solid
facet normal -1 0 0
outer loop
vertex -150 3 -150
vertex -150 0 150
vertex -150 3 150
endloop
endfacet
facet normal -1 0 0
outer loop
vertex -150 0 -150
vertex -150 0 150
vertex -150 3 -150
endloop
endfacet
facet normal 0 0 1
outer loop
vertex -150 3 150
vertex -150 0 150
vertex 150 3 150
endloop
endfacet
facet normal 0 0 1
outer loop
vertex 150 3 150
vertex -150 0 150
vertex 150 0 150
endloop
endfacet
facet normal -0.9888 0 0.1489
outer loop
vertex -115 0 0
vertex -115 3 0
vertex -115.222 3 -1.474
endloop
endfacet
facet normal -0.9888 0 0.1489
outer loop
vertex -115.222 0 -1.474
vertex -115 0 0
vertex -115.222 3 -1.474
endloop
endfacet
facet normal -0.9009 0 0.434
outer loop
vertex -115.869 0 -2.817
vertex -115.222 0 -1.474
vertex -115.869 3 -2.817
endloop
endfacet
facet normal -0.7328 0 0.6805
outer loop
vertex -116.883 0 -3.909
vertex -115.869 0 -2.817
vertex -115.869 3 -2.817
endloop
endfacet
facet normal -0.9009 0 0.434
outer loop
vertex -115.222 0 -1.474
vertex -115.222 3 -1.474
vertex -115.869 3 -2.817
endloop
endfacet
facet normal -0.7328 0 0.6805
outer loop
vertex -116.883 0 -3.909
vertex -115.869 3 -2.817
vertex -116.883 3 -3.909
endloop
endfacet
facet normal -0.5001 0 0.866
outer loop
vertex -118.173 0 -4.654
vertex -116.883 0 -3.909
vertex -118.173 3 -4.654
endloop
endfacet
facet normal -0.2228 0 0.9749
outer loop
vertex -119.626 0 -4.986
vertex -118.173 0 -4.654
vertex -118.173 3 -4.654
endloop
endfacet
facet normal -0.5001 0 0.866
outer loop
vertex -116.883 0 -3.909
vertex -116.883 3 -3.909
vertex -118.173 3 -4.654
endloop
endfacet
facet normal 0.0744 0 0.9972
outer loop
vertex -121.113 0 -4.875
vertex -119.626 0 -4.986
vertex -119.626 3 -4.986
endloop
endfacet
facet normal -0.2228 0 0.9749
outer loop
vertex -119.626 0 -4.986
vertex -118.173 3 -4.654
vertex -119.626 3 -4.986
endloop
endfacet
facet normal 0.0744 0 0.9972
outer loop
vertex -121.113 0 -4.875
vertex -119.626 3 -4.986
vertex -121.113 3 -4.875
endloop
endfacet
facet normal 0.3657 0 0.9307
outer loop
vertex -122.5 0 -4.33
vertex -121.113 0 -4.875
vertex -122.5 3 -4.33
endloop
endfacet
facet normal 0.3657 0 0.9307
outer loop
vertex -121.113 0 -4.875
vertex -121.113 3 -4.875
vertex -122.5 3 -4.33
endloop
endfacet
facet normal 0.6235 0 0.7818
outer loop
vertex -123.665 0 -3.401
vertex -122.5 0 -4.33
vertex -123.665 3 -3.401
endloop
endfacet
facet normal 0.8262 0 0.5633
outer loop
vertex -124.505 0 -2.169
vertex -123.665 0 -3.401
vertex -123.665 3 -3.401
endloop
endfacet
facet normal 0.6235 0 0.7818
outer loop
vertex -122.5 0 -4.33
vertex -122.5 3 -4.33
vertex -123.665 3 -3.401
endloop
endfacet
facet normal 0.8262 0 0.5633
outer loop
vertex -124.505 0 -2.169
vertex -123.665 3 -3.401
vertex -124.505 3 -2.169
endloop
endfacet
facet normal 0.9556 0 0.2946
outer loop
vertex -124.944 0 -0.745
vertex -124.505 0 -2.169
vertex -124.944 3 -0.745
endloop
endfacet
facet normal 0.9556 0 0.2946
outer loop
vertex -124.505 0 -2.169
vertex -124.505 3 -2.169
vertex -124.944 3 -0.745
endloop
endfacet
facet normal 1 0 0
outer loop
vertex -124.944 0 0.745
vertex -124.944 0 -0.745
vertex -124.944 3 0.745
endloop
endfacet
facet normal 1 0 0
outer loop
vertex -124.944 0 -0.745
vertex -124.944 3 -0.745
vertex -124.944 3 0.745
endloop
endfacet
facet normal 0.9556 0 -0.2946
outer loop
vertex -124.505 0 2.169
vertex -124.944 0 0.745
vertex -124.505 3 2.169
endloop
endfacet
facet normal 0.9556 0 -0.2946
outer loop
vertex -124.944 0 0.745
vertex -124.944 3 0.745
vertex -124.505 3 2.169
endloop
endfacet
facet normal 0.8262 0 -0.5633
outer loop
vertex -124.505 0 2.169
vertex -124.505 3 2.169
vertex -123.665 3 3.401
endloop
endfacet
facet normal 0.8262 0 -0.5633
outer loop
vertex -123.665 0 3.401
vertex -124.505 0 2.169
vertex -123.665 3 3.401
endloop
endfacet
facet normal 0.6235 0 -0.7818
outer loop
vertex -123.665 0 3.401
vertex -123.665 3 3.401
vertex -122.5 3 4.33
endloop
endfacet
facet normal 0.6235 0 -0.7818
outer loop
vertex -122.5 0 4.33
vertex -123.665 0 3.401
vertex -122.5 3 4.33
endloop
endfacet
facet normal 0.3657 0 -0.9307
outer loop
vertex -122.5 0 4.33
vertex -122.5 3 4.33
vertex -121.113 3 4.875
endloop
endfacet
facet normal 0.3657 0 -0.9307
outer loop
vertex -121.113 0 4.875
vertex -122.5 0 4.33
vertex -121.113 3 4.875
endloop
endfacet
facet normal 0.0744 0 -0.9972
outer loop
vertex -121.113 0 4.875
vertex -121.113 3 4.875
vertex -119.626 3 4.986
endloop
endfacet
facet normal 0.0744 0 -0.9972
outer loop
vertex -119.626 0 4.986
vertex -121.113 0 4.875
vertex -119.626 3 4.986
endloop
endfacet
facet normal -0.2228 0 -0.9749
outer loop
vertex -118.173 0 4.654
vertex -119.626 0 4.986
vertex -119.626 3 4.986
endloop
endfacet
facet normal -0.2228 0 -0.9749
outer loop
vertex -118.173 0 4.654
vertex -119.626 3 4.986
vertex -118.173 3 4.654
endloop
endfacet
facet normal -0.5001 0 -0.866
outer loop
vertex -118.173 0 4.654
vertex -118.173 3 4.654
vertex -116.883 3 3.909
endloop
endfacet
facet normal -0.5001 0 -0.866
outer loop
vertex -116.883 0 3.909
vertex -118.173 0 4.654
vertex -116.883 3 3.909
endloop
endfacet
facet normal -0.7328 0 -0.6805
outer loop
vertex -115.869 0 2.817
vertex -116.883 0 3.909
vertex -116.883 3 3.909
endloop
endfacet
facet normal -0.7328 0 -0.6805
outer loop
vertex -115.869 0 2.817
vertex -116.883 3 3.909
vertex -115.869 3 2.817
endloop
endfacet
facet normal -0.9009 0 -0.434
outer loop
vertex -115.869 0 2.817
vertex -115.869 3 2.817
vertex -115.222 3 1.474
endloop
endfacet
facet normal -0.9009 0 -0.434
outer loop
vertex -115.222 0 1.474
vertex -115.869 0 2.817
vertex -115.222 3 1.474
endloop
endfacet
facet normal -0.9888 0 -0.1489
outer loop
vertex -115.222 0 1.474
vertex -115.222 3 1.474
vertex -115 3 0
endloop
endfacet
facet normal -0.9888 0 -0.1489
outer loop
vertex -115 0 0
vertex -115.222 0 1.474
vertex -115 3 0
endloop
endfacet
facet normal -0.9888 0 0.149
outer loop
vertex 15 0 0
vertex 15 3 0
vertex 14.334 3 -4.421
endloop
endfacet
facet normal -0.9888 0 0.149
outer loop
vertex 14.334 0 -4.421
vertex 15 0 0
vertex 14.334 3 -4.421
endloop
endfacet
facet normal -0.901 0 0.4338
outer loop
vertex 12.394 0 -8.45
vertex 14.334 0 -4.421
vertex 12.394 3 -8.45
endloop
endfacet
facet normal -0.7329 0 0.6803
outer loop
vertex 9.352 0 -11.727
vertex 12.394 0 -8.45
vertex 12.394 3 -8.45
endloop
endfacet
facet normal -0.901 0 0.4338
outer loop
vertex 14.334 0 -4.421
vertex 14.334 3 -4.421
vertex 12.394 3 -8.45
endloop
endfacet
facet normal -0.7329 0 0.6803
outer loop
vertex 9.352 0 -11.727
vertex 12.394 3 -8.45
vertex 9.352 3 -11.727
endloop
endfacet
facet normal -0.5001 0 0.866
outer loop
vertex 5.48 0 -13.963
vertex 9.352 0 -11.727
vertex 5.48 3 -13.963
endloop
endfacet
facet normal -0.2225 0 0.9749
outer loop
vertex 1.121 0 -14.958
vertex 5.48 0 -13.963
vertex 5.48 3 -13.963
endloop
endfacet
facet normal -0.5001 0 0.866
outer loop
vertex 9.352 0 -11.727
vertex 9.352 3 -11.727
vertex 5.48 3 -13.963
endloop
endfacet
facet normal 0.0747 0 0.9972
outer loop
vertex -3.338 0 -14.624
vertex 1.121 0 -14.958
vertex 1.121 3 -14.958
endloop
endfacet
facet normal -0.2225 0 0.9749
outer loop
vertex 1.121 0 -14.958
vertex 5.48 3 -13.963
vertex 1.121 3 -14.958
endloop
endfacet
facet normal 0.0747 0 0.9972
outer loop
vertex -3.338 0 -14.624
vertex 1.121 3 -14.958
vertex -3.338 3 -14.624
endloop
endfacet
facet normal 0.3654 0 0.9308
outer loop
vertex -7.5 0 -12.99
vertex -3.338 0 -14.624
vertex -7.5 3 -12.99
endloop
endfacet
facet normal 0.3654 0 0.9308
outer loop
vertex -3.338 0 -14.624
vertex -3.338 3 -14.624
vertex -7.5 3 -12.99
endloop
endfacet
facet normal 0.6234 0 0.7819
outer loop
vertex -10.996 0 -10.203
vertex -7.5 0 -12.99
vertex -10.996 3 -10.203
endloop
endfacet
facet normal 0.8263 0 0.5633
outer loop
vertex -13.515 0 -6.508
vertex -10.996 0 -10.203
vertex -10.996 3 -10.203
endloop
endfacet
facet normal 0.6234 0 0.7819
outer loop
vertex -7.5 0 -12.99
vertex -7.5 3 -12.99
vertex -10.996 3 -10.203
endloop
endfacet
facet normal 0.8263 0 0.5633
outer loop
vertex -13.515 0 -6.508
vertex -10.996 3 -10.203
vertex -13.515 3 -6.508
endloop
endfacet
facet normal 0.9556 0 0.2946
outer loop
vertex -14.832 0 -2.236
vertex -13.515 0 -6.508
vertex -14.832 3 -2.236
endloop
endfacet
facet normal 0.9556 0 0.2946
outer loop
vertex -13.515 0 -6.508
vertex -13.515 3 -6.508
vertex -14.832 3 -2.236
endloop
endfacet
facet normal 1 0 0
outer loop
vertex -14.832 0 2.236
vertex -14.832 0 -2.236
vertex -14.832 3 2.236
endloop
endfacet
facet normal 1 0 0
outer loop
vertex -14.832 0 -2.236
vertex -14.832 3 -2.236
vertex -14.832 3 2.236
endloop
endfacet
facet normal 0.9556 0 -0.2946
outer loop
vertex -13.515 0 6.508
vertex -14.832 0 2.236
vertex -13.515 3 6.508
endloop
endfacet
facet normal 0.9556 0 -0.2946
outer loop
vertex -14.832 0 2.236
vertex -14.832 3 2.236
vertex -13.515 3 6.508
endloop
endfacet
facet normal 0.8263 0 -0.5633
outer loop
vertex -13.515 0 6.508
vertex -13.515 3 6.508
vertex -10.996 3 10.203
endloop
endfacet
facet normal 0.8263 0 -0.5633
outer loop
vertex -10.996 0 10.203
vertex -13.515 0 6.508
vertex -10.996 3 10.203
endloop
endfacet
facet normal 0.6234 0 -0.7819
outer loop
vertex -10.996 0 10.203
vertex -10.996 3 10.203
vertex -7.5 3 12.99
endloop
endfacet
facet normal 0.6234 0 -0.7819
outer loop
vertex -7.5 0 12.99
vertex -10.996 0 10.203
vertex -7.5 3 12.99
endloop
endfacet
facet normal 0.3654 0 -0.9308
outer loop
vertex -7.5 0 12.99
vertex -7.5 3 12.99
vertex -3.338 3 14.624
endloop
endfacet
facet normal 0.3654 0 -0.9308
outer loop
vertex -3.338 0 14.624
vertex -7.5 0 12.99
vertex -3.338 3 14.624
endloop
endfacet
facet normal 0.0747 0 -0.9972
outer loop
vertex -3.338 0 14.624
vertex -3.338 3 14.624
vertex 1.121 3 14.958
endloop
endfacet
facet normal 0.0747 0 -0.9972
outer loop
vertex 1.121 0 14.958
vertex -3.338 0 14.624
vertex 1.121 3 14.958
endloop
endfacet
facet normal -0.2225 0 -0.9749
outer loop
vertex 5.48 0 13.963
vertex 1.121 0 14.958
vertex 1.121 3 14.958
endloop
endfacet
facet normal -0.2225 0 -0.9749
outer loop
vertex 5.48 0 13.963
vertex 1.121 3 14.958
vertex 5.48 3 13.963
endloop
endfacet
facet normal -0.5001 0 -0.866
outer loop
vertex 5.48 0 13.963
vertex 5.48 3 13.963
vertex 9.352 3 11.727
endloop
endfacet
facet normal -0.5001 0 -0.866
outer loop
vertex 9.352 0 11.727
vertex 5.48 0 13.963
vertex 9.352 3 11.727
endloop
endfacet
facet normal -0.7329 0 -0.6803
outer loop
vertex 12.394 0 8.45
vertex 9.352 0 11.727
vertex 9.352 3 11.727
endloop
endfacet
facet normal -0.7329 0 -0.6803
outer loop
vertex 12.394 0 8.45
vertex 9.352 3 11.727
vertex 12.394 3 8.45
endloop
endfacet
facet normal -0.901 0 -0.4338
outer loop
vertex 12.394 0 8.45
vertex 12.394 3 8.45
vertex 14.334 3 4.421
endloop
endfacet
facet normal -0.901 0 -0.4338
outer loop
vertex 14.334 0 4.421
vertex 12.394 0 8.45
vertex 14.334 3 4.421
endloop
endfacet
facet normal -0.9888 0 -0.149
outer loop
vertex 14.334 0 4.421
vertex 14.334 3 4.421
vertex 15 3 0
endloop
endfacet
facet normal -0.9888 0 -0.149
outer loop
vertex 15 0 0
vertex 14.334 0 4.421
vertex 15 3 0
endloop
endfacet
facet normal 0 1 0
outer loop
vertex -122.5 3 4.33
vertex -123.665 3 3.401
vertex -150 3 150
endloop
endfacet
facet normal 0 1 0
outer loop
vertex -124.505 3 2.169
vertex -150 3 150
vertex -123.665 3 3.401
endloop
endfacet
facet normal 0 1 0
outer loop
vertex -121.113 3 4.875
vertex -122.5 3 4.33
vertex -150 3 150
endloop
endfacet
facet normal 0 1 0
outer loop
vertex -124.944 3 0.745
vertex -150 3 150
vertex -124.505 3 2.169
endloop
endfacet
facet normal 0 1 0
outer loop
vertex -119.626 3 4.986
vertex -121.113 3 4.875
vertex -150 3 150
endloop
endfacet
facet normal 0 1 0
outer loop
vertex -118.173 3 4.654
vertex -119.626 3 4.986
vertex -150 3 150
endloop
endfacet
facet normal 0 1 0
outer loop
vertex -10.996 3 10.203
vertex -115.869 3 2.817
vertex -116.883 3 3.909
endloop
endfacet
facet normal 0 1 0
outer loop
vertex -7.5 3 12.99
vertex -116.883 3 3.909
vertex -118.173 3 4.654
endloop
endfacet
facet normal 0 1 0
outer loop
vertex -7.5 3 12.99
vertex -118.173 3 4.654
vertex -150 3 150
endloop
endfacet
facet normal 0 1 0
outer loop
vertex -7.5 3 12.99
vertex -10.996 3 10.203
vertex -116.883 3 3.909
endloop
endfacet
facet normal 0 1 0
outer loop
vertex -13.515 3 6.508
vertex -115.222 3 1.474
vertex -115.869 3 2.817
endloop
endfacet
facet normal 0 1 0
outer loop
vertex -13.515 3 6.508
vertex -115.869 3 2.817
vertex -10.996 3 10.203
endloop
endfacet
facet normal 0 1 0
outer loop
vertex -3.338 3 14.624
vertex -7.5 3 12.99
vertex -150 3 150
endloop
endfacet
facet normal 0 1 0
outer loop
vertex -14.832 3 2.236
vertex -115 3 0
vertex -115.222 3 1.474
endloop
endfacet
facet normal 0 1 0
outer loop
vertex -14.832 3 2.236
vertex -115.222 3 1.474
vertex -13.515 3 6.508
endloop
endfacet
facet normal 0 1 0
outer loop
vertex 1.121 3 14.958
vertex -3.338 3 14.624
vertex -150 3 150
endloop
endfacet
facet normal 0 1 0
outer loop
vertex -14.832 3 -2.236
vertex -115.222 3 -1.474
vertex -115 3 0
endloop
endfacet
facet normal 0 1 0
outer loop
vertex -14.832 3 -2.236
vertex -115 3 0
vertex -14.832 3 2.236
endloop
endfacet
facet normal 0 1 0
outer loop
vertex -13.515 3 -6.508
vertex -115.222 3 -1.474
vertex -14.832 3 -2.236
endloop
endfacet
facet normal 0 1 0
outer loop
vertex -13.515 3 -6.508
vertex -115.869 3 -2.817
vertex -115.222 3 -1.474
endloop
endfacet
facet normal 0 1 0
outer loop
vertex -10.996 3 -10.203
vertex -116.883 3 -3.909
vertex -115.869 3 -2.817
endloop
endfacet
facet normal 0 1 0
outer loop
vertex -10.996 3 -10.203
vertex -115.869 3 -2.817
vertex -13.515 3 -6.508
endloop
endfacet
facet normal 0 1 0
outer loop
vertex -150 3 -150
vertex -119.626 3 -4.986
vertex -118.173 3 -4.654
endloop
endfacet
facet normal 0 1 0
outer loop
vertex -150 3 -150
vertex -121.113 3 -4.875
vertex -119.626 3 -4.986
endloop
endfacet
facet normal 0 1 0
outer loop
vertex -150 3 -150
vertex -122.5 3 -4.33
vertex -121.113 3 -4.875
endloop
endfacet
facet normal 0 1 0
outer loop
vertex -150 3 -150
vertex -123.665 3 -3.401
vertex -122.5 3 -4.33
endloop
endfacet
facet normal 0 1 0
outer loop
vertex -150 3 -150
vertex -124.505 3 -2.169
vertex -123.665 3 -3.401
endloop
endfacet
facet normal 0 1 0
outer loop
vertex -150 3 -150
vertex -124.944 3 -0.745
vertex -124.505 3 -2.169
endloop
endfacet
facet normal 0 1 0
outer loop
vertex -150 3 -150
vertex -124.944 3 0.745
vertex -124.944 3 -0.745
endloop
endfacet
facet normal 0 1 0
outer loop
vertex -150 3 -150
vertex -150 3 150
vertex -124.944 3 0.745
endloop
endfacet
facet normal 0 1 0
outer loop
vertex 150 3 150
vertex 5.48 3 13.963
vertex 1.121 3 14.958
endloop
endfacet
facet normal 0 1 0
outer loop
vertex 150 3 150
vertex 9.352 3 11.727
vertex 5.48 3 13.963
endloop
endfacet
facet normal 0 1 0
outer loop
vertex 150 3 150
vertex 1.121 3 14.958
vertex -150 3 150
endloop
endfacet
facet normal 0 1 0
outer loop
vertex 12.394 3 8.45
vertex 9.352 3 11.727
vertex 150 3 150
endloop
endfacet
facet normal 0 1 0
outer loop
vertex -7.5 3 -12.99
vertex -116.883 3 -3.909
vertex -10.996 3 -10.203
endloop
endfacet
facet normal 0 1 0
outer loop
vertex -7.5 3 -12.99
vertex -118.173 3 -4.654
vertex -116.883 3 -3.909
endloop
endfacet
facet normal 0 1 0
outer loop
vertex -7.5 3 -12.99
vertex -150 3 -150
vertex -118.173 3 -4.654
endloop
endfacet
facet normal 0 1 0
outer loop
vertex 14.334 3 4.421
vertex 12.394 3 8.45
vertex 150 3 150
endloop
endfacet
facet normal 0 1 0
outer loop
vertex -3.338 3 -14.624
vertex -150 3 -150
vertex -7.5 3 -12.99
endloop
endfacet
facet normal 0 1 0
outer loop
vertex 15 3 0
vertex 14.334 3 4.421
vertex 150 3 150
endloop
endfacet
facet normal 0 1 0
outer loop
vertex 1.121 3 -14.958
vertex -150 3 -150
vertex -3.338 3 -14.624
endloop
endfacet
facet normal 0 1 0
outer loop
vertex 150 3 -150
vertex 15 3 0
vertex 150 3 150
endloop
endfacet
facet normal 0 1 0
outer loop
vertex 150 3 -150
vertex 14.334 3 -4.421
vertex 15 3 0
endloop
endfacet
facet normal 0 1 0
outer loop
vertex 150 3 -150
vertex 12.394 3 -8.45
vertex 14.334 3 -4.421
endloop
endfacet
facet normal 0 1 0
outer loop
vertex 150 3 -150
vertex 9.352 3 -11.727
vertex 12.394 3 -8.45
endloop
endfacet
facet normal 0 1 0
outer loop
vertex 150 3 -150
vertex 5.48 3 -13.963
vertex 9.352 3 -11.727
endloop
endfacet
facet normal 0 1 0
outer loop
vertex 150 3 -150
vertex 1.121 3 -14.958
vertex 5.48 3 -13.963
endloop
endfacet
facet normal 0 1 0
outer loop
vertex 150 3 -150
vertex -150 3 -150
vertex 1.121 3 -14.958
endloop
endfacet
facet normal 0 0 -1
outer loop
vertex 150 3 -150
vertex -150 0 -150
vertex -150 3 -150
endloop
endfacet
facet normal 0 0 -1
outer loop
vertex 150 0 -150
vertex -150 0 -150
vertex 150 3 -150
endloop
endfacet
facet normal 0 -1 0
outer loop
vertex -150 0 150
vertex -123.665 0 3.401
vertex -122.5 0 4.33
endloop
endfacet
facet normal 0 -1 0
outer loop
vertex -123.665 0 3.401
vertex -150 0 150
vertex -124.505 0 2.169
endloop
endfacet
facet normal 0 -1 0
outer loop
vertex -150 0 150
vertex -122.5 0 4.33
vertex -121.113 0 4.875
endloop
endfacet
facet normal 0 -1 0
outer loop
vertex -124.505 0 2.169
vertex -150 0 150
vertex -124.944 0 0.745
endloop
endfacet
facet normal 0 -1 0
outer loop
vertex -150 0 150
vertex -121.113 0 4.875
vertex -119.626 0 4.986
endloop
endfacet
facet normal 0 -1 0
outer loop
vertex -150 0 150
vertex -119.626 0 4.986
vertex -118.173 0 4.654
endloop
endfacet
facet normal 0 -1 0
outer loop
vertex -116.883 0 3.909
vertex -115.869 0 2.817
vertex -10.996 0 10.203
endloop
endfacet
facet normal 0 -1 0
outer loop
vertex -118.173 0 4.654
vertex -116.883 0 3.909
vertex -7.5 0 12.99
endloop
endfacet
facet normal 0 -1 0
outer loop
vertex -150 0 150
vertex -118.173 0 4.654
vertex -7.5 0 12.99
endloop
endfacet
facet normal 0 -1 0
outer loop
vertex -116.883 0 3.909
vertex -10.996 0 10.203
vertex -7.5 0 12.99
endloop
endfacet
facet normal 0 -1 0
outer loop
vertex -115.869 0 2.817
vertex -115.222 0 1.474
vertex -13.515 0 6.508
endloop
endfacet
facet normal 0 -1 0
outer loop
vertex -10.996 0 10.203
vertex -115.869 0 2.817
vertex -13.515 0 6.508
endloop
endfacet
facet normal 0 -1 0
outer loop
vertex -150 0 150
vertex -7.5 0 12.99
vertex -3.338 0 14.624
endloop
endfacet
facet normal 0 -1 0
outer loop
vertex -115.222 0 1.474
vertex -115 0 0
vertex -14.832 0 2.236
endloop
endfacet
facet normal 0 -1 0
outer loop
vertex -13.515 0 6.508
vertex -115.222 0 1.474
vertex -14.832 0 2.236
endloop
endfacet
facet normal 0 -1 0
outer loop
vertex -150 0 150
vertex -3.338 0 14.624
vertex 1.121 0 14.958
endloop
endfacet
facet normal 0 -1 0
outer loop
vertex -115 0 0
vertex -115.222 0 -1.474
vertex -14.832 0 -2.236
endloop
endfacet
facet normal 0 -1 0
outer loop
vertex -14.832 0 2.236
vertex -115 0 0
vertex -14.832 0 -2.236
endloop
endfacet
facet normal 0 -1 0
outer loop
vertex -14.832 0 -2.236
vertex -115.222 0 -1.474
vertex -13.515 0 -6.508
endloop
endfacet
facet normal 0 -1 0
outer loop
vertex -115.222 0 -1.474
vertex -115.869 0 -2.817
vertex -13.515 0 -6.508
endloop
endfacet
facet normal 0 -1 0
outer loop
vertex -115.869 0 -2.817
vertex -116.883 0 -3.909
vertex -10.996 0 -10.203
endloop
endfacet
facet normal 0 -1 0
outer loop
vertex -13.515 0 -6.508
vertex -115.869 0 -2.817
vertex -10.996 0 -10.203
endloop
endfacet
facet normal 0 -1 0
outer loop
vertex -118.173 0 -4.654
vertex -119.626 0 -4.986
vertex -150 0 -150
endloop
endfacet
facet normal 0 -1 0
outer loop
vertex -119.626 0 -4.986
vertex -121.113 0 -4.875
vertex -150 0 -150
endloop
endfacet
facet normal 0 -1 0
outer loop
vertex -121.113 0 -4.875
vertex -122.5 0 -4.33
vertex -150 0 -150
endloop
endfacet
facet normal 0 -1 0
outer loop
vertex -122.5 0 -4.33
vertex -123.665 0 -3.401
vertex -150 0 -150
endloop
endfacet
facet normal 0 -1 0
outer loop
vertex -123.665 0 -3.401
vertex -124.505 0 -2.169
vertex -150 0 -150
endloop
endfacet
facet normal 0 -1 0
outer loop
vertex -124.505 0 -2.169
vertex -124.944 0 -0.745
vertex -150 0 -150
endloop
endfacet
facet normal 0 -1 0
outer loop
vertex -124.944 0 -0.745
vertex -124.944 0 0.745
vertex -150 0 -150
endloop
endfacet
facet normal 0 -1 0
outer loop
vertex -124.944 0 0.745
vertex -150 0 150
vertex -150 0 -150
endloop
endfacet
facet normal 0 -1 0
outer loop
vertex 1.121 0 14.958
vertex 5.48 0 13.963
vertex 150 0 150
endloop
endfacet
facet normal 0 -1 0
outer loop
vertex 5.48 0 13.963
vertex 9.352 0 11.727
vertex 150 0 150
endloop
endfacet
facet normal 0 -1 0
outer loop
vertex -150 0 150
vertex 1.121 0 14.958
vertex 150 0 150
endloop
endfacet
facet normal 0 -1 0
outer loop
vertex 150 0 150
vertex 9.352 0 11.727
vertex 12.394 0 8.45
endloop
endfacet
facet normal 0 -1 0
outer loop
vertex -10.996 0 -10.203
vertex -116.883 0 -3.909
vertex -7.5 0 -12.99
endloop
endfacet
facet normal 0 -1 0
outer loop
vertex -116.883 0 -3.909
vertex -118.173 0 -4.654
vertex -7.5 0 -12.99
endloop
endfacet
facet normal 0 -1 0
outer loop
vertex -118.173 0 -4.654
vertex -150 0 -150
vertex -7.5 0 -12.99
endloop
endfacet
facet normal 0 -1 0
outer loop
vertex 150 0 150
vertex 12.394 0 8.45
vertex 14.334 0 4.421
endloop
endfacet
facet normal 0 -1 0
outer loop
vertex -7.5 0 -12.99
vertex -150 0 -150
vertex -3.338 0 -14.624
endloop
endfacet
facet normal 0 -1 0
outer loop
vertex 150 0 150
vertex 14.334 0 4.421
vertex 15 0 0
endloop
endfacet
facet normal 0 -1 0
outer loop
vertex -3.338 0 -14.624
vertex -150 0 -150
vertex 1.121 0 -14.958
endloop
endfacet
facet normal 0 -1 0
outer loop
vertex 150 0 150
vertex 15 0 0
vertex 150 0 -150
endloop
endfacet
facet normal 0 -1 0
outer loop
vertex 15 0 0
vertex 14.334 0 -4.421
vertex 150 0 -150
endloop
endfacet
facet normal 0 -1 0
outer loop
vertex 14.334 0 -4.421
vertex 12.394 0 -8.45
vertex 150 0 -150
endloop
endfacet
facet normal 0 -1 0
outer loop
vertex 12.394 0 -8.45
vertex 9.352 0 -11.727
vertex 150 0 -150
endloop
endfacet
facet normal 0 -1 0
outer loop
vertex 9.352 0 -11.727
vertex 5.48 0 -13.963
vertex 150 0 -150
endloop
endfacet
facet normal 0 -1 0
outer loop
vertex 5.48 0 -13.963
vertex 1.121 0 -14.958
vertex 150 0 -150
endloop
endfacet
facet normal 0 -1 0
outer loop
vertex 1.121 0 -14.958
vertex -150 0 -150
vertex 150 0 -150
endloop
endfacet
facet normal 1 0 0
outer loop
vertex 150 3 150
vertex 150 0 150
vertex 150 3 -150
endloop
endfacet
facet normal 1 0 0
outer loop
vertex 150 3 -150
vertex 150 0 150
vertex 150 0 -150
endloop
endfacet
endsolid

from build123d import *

# Parameters (mm, degrees)
SKETCH2_W           = 300
SKETCH2_H           = 300
BOSS_EXTRUDE1_DEPTH = 3
SKETCH3_R           = 15
CUT_EXTRUDE1_DEPTH  = 4
SKETCH4_R           = 5
CUT_EXTRUDE2_DEPTH  = 4


with BuildPart() as part:
    # Sketch2 → Boss-Extrude1 (new body)
    with BuildSketch(Plane(origin=(0, 0, 0), x_dir=(1, 0, 0), z_dir=(0, 1, 0))):
        Rectangle(SKETCH2_W, SKETCH2_H)
    extrude(amount=BOSS_EXTRUDE1_DEPTH)

    # Sketch3 → Cut-Extrude1 (cut, through all)
    with BuildSketch(Plane(origin=(0, 3, 0), x_dir=(1, 0, 0), z_dir=(0, 1, 0))):
        Circle(SKETCH3_R)
    extrude(amount=-CUT_EXTRUDE1_DEPTH, mode=Mode.SUBTRACT)

    # Sketch4 → Cut-Extrude2 (cut, through all)
    with BuildSketch(Plane(origin=(0, 3, 0), x_dir=(1, 0, 0), z_dir=(0, 1, 0))):
        with Locations((-120, 0)):
            Circle(SKETCH4_R)
    extrude(amount=-CUT_EXTRUDE2_DEPTH, mode=Mode.SUBTRACT)


solid = part.part
